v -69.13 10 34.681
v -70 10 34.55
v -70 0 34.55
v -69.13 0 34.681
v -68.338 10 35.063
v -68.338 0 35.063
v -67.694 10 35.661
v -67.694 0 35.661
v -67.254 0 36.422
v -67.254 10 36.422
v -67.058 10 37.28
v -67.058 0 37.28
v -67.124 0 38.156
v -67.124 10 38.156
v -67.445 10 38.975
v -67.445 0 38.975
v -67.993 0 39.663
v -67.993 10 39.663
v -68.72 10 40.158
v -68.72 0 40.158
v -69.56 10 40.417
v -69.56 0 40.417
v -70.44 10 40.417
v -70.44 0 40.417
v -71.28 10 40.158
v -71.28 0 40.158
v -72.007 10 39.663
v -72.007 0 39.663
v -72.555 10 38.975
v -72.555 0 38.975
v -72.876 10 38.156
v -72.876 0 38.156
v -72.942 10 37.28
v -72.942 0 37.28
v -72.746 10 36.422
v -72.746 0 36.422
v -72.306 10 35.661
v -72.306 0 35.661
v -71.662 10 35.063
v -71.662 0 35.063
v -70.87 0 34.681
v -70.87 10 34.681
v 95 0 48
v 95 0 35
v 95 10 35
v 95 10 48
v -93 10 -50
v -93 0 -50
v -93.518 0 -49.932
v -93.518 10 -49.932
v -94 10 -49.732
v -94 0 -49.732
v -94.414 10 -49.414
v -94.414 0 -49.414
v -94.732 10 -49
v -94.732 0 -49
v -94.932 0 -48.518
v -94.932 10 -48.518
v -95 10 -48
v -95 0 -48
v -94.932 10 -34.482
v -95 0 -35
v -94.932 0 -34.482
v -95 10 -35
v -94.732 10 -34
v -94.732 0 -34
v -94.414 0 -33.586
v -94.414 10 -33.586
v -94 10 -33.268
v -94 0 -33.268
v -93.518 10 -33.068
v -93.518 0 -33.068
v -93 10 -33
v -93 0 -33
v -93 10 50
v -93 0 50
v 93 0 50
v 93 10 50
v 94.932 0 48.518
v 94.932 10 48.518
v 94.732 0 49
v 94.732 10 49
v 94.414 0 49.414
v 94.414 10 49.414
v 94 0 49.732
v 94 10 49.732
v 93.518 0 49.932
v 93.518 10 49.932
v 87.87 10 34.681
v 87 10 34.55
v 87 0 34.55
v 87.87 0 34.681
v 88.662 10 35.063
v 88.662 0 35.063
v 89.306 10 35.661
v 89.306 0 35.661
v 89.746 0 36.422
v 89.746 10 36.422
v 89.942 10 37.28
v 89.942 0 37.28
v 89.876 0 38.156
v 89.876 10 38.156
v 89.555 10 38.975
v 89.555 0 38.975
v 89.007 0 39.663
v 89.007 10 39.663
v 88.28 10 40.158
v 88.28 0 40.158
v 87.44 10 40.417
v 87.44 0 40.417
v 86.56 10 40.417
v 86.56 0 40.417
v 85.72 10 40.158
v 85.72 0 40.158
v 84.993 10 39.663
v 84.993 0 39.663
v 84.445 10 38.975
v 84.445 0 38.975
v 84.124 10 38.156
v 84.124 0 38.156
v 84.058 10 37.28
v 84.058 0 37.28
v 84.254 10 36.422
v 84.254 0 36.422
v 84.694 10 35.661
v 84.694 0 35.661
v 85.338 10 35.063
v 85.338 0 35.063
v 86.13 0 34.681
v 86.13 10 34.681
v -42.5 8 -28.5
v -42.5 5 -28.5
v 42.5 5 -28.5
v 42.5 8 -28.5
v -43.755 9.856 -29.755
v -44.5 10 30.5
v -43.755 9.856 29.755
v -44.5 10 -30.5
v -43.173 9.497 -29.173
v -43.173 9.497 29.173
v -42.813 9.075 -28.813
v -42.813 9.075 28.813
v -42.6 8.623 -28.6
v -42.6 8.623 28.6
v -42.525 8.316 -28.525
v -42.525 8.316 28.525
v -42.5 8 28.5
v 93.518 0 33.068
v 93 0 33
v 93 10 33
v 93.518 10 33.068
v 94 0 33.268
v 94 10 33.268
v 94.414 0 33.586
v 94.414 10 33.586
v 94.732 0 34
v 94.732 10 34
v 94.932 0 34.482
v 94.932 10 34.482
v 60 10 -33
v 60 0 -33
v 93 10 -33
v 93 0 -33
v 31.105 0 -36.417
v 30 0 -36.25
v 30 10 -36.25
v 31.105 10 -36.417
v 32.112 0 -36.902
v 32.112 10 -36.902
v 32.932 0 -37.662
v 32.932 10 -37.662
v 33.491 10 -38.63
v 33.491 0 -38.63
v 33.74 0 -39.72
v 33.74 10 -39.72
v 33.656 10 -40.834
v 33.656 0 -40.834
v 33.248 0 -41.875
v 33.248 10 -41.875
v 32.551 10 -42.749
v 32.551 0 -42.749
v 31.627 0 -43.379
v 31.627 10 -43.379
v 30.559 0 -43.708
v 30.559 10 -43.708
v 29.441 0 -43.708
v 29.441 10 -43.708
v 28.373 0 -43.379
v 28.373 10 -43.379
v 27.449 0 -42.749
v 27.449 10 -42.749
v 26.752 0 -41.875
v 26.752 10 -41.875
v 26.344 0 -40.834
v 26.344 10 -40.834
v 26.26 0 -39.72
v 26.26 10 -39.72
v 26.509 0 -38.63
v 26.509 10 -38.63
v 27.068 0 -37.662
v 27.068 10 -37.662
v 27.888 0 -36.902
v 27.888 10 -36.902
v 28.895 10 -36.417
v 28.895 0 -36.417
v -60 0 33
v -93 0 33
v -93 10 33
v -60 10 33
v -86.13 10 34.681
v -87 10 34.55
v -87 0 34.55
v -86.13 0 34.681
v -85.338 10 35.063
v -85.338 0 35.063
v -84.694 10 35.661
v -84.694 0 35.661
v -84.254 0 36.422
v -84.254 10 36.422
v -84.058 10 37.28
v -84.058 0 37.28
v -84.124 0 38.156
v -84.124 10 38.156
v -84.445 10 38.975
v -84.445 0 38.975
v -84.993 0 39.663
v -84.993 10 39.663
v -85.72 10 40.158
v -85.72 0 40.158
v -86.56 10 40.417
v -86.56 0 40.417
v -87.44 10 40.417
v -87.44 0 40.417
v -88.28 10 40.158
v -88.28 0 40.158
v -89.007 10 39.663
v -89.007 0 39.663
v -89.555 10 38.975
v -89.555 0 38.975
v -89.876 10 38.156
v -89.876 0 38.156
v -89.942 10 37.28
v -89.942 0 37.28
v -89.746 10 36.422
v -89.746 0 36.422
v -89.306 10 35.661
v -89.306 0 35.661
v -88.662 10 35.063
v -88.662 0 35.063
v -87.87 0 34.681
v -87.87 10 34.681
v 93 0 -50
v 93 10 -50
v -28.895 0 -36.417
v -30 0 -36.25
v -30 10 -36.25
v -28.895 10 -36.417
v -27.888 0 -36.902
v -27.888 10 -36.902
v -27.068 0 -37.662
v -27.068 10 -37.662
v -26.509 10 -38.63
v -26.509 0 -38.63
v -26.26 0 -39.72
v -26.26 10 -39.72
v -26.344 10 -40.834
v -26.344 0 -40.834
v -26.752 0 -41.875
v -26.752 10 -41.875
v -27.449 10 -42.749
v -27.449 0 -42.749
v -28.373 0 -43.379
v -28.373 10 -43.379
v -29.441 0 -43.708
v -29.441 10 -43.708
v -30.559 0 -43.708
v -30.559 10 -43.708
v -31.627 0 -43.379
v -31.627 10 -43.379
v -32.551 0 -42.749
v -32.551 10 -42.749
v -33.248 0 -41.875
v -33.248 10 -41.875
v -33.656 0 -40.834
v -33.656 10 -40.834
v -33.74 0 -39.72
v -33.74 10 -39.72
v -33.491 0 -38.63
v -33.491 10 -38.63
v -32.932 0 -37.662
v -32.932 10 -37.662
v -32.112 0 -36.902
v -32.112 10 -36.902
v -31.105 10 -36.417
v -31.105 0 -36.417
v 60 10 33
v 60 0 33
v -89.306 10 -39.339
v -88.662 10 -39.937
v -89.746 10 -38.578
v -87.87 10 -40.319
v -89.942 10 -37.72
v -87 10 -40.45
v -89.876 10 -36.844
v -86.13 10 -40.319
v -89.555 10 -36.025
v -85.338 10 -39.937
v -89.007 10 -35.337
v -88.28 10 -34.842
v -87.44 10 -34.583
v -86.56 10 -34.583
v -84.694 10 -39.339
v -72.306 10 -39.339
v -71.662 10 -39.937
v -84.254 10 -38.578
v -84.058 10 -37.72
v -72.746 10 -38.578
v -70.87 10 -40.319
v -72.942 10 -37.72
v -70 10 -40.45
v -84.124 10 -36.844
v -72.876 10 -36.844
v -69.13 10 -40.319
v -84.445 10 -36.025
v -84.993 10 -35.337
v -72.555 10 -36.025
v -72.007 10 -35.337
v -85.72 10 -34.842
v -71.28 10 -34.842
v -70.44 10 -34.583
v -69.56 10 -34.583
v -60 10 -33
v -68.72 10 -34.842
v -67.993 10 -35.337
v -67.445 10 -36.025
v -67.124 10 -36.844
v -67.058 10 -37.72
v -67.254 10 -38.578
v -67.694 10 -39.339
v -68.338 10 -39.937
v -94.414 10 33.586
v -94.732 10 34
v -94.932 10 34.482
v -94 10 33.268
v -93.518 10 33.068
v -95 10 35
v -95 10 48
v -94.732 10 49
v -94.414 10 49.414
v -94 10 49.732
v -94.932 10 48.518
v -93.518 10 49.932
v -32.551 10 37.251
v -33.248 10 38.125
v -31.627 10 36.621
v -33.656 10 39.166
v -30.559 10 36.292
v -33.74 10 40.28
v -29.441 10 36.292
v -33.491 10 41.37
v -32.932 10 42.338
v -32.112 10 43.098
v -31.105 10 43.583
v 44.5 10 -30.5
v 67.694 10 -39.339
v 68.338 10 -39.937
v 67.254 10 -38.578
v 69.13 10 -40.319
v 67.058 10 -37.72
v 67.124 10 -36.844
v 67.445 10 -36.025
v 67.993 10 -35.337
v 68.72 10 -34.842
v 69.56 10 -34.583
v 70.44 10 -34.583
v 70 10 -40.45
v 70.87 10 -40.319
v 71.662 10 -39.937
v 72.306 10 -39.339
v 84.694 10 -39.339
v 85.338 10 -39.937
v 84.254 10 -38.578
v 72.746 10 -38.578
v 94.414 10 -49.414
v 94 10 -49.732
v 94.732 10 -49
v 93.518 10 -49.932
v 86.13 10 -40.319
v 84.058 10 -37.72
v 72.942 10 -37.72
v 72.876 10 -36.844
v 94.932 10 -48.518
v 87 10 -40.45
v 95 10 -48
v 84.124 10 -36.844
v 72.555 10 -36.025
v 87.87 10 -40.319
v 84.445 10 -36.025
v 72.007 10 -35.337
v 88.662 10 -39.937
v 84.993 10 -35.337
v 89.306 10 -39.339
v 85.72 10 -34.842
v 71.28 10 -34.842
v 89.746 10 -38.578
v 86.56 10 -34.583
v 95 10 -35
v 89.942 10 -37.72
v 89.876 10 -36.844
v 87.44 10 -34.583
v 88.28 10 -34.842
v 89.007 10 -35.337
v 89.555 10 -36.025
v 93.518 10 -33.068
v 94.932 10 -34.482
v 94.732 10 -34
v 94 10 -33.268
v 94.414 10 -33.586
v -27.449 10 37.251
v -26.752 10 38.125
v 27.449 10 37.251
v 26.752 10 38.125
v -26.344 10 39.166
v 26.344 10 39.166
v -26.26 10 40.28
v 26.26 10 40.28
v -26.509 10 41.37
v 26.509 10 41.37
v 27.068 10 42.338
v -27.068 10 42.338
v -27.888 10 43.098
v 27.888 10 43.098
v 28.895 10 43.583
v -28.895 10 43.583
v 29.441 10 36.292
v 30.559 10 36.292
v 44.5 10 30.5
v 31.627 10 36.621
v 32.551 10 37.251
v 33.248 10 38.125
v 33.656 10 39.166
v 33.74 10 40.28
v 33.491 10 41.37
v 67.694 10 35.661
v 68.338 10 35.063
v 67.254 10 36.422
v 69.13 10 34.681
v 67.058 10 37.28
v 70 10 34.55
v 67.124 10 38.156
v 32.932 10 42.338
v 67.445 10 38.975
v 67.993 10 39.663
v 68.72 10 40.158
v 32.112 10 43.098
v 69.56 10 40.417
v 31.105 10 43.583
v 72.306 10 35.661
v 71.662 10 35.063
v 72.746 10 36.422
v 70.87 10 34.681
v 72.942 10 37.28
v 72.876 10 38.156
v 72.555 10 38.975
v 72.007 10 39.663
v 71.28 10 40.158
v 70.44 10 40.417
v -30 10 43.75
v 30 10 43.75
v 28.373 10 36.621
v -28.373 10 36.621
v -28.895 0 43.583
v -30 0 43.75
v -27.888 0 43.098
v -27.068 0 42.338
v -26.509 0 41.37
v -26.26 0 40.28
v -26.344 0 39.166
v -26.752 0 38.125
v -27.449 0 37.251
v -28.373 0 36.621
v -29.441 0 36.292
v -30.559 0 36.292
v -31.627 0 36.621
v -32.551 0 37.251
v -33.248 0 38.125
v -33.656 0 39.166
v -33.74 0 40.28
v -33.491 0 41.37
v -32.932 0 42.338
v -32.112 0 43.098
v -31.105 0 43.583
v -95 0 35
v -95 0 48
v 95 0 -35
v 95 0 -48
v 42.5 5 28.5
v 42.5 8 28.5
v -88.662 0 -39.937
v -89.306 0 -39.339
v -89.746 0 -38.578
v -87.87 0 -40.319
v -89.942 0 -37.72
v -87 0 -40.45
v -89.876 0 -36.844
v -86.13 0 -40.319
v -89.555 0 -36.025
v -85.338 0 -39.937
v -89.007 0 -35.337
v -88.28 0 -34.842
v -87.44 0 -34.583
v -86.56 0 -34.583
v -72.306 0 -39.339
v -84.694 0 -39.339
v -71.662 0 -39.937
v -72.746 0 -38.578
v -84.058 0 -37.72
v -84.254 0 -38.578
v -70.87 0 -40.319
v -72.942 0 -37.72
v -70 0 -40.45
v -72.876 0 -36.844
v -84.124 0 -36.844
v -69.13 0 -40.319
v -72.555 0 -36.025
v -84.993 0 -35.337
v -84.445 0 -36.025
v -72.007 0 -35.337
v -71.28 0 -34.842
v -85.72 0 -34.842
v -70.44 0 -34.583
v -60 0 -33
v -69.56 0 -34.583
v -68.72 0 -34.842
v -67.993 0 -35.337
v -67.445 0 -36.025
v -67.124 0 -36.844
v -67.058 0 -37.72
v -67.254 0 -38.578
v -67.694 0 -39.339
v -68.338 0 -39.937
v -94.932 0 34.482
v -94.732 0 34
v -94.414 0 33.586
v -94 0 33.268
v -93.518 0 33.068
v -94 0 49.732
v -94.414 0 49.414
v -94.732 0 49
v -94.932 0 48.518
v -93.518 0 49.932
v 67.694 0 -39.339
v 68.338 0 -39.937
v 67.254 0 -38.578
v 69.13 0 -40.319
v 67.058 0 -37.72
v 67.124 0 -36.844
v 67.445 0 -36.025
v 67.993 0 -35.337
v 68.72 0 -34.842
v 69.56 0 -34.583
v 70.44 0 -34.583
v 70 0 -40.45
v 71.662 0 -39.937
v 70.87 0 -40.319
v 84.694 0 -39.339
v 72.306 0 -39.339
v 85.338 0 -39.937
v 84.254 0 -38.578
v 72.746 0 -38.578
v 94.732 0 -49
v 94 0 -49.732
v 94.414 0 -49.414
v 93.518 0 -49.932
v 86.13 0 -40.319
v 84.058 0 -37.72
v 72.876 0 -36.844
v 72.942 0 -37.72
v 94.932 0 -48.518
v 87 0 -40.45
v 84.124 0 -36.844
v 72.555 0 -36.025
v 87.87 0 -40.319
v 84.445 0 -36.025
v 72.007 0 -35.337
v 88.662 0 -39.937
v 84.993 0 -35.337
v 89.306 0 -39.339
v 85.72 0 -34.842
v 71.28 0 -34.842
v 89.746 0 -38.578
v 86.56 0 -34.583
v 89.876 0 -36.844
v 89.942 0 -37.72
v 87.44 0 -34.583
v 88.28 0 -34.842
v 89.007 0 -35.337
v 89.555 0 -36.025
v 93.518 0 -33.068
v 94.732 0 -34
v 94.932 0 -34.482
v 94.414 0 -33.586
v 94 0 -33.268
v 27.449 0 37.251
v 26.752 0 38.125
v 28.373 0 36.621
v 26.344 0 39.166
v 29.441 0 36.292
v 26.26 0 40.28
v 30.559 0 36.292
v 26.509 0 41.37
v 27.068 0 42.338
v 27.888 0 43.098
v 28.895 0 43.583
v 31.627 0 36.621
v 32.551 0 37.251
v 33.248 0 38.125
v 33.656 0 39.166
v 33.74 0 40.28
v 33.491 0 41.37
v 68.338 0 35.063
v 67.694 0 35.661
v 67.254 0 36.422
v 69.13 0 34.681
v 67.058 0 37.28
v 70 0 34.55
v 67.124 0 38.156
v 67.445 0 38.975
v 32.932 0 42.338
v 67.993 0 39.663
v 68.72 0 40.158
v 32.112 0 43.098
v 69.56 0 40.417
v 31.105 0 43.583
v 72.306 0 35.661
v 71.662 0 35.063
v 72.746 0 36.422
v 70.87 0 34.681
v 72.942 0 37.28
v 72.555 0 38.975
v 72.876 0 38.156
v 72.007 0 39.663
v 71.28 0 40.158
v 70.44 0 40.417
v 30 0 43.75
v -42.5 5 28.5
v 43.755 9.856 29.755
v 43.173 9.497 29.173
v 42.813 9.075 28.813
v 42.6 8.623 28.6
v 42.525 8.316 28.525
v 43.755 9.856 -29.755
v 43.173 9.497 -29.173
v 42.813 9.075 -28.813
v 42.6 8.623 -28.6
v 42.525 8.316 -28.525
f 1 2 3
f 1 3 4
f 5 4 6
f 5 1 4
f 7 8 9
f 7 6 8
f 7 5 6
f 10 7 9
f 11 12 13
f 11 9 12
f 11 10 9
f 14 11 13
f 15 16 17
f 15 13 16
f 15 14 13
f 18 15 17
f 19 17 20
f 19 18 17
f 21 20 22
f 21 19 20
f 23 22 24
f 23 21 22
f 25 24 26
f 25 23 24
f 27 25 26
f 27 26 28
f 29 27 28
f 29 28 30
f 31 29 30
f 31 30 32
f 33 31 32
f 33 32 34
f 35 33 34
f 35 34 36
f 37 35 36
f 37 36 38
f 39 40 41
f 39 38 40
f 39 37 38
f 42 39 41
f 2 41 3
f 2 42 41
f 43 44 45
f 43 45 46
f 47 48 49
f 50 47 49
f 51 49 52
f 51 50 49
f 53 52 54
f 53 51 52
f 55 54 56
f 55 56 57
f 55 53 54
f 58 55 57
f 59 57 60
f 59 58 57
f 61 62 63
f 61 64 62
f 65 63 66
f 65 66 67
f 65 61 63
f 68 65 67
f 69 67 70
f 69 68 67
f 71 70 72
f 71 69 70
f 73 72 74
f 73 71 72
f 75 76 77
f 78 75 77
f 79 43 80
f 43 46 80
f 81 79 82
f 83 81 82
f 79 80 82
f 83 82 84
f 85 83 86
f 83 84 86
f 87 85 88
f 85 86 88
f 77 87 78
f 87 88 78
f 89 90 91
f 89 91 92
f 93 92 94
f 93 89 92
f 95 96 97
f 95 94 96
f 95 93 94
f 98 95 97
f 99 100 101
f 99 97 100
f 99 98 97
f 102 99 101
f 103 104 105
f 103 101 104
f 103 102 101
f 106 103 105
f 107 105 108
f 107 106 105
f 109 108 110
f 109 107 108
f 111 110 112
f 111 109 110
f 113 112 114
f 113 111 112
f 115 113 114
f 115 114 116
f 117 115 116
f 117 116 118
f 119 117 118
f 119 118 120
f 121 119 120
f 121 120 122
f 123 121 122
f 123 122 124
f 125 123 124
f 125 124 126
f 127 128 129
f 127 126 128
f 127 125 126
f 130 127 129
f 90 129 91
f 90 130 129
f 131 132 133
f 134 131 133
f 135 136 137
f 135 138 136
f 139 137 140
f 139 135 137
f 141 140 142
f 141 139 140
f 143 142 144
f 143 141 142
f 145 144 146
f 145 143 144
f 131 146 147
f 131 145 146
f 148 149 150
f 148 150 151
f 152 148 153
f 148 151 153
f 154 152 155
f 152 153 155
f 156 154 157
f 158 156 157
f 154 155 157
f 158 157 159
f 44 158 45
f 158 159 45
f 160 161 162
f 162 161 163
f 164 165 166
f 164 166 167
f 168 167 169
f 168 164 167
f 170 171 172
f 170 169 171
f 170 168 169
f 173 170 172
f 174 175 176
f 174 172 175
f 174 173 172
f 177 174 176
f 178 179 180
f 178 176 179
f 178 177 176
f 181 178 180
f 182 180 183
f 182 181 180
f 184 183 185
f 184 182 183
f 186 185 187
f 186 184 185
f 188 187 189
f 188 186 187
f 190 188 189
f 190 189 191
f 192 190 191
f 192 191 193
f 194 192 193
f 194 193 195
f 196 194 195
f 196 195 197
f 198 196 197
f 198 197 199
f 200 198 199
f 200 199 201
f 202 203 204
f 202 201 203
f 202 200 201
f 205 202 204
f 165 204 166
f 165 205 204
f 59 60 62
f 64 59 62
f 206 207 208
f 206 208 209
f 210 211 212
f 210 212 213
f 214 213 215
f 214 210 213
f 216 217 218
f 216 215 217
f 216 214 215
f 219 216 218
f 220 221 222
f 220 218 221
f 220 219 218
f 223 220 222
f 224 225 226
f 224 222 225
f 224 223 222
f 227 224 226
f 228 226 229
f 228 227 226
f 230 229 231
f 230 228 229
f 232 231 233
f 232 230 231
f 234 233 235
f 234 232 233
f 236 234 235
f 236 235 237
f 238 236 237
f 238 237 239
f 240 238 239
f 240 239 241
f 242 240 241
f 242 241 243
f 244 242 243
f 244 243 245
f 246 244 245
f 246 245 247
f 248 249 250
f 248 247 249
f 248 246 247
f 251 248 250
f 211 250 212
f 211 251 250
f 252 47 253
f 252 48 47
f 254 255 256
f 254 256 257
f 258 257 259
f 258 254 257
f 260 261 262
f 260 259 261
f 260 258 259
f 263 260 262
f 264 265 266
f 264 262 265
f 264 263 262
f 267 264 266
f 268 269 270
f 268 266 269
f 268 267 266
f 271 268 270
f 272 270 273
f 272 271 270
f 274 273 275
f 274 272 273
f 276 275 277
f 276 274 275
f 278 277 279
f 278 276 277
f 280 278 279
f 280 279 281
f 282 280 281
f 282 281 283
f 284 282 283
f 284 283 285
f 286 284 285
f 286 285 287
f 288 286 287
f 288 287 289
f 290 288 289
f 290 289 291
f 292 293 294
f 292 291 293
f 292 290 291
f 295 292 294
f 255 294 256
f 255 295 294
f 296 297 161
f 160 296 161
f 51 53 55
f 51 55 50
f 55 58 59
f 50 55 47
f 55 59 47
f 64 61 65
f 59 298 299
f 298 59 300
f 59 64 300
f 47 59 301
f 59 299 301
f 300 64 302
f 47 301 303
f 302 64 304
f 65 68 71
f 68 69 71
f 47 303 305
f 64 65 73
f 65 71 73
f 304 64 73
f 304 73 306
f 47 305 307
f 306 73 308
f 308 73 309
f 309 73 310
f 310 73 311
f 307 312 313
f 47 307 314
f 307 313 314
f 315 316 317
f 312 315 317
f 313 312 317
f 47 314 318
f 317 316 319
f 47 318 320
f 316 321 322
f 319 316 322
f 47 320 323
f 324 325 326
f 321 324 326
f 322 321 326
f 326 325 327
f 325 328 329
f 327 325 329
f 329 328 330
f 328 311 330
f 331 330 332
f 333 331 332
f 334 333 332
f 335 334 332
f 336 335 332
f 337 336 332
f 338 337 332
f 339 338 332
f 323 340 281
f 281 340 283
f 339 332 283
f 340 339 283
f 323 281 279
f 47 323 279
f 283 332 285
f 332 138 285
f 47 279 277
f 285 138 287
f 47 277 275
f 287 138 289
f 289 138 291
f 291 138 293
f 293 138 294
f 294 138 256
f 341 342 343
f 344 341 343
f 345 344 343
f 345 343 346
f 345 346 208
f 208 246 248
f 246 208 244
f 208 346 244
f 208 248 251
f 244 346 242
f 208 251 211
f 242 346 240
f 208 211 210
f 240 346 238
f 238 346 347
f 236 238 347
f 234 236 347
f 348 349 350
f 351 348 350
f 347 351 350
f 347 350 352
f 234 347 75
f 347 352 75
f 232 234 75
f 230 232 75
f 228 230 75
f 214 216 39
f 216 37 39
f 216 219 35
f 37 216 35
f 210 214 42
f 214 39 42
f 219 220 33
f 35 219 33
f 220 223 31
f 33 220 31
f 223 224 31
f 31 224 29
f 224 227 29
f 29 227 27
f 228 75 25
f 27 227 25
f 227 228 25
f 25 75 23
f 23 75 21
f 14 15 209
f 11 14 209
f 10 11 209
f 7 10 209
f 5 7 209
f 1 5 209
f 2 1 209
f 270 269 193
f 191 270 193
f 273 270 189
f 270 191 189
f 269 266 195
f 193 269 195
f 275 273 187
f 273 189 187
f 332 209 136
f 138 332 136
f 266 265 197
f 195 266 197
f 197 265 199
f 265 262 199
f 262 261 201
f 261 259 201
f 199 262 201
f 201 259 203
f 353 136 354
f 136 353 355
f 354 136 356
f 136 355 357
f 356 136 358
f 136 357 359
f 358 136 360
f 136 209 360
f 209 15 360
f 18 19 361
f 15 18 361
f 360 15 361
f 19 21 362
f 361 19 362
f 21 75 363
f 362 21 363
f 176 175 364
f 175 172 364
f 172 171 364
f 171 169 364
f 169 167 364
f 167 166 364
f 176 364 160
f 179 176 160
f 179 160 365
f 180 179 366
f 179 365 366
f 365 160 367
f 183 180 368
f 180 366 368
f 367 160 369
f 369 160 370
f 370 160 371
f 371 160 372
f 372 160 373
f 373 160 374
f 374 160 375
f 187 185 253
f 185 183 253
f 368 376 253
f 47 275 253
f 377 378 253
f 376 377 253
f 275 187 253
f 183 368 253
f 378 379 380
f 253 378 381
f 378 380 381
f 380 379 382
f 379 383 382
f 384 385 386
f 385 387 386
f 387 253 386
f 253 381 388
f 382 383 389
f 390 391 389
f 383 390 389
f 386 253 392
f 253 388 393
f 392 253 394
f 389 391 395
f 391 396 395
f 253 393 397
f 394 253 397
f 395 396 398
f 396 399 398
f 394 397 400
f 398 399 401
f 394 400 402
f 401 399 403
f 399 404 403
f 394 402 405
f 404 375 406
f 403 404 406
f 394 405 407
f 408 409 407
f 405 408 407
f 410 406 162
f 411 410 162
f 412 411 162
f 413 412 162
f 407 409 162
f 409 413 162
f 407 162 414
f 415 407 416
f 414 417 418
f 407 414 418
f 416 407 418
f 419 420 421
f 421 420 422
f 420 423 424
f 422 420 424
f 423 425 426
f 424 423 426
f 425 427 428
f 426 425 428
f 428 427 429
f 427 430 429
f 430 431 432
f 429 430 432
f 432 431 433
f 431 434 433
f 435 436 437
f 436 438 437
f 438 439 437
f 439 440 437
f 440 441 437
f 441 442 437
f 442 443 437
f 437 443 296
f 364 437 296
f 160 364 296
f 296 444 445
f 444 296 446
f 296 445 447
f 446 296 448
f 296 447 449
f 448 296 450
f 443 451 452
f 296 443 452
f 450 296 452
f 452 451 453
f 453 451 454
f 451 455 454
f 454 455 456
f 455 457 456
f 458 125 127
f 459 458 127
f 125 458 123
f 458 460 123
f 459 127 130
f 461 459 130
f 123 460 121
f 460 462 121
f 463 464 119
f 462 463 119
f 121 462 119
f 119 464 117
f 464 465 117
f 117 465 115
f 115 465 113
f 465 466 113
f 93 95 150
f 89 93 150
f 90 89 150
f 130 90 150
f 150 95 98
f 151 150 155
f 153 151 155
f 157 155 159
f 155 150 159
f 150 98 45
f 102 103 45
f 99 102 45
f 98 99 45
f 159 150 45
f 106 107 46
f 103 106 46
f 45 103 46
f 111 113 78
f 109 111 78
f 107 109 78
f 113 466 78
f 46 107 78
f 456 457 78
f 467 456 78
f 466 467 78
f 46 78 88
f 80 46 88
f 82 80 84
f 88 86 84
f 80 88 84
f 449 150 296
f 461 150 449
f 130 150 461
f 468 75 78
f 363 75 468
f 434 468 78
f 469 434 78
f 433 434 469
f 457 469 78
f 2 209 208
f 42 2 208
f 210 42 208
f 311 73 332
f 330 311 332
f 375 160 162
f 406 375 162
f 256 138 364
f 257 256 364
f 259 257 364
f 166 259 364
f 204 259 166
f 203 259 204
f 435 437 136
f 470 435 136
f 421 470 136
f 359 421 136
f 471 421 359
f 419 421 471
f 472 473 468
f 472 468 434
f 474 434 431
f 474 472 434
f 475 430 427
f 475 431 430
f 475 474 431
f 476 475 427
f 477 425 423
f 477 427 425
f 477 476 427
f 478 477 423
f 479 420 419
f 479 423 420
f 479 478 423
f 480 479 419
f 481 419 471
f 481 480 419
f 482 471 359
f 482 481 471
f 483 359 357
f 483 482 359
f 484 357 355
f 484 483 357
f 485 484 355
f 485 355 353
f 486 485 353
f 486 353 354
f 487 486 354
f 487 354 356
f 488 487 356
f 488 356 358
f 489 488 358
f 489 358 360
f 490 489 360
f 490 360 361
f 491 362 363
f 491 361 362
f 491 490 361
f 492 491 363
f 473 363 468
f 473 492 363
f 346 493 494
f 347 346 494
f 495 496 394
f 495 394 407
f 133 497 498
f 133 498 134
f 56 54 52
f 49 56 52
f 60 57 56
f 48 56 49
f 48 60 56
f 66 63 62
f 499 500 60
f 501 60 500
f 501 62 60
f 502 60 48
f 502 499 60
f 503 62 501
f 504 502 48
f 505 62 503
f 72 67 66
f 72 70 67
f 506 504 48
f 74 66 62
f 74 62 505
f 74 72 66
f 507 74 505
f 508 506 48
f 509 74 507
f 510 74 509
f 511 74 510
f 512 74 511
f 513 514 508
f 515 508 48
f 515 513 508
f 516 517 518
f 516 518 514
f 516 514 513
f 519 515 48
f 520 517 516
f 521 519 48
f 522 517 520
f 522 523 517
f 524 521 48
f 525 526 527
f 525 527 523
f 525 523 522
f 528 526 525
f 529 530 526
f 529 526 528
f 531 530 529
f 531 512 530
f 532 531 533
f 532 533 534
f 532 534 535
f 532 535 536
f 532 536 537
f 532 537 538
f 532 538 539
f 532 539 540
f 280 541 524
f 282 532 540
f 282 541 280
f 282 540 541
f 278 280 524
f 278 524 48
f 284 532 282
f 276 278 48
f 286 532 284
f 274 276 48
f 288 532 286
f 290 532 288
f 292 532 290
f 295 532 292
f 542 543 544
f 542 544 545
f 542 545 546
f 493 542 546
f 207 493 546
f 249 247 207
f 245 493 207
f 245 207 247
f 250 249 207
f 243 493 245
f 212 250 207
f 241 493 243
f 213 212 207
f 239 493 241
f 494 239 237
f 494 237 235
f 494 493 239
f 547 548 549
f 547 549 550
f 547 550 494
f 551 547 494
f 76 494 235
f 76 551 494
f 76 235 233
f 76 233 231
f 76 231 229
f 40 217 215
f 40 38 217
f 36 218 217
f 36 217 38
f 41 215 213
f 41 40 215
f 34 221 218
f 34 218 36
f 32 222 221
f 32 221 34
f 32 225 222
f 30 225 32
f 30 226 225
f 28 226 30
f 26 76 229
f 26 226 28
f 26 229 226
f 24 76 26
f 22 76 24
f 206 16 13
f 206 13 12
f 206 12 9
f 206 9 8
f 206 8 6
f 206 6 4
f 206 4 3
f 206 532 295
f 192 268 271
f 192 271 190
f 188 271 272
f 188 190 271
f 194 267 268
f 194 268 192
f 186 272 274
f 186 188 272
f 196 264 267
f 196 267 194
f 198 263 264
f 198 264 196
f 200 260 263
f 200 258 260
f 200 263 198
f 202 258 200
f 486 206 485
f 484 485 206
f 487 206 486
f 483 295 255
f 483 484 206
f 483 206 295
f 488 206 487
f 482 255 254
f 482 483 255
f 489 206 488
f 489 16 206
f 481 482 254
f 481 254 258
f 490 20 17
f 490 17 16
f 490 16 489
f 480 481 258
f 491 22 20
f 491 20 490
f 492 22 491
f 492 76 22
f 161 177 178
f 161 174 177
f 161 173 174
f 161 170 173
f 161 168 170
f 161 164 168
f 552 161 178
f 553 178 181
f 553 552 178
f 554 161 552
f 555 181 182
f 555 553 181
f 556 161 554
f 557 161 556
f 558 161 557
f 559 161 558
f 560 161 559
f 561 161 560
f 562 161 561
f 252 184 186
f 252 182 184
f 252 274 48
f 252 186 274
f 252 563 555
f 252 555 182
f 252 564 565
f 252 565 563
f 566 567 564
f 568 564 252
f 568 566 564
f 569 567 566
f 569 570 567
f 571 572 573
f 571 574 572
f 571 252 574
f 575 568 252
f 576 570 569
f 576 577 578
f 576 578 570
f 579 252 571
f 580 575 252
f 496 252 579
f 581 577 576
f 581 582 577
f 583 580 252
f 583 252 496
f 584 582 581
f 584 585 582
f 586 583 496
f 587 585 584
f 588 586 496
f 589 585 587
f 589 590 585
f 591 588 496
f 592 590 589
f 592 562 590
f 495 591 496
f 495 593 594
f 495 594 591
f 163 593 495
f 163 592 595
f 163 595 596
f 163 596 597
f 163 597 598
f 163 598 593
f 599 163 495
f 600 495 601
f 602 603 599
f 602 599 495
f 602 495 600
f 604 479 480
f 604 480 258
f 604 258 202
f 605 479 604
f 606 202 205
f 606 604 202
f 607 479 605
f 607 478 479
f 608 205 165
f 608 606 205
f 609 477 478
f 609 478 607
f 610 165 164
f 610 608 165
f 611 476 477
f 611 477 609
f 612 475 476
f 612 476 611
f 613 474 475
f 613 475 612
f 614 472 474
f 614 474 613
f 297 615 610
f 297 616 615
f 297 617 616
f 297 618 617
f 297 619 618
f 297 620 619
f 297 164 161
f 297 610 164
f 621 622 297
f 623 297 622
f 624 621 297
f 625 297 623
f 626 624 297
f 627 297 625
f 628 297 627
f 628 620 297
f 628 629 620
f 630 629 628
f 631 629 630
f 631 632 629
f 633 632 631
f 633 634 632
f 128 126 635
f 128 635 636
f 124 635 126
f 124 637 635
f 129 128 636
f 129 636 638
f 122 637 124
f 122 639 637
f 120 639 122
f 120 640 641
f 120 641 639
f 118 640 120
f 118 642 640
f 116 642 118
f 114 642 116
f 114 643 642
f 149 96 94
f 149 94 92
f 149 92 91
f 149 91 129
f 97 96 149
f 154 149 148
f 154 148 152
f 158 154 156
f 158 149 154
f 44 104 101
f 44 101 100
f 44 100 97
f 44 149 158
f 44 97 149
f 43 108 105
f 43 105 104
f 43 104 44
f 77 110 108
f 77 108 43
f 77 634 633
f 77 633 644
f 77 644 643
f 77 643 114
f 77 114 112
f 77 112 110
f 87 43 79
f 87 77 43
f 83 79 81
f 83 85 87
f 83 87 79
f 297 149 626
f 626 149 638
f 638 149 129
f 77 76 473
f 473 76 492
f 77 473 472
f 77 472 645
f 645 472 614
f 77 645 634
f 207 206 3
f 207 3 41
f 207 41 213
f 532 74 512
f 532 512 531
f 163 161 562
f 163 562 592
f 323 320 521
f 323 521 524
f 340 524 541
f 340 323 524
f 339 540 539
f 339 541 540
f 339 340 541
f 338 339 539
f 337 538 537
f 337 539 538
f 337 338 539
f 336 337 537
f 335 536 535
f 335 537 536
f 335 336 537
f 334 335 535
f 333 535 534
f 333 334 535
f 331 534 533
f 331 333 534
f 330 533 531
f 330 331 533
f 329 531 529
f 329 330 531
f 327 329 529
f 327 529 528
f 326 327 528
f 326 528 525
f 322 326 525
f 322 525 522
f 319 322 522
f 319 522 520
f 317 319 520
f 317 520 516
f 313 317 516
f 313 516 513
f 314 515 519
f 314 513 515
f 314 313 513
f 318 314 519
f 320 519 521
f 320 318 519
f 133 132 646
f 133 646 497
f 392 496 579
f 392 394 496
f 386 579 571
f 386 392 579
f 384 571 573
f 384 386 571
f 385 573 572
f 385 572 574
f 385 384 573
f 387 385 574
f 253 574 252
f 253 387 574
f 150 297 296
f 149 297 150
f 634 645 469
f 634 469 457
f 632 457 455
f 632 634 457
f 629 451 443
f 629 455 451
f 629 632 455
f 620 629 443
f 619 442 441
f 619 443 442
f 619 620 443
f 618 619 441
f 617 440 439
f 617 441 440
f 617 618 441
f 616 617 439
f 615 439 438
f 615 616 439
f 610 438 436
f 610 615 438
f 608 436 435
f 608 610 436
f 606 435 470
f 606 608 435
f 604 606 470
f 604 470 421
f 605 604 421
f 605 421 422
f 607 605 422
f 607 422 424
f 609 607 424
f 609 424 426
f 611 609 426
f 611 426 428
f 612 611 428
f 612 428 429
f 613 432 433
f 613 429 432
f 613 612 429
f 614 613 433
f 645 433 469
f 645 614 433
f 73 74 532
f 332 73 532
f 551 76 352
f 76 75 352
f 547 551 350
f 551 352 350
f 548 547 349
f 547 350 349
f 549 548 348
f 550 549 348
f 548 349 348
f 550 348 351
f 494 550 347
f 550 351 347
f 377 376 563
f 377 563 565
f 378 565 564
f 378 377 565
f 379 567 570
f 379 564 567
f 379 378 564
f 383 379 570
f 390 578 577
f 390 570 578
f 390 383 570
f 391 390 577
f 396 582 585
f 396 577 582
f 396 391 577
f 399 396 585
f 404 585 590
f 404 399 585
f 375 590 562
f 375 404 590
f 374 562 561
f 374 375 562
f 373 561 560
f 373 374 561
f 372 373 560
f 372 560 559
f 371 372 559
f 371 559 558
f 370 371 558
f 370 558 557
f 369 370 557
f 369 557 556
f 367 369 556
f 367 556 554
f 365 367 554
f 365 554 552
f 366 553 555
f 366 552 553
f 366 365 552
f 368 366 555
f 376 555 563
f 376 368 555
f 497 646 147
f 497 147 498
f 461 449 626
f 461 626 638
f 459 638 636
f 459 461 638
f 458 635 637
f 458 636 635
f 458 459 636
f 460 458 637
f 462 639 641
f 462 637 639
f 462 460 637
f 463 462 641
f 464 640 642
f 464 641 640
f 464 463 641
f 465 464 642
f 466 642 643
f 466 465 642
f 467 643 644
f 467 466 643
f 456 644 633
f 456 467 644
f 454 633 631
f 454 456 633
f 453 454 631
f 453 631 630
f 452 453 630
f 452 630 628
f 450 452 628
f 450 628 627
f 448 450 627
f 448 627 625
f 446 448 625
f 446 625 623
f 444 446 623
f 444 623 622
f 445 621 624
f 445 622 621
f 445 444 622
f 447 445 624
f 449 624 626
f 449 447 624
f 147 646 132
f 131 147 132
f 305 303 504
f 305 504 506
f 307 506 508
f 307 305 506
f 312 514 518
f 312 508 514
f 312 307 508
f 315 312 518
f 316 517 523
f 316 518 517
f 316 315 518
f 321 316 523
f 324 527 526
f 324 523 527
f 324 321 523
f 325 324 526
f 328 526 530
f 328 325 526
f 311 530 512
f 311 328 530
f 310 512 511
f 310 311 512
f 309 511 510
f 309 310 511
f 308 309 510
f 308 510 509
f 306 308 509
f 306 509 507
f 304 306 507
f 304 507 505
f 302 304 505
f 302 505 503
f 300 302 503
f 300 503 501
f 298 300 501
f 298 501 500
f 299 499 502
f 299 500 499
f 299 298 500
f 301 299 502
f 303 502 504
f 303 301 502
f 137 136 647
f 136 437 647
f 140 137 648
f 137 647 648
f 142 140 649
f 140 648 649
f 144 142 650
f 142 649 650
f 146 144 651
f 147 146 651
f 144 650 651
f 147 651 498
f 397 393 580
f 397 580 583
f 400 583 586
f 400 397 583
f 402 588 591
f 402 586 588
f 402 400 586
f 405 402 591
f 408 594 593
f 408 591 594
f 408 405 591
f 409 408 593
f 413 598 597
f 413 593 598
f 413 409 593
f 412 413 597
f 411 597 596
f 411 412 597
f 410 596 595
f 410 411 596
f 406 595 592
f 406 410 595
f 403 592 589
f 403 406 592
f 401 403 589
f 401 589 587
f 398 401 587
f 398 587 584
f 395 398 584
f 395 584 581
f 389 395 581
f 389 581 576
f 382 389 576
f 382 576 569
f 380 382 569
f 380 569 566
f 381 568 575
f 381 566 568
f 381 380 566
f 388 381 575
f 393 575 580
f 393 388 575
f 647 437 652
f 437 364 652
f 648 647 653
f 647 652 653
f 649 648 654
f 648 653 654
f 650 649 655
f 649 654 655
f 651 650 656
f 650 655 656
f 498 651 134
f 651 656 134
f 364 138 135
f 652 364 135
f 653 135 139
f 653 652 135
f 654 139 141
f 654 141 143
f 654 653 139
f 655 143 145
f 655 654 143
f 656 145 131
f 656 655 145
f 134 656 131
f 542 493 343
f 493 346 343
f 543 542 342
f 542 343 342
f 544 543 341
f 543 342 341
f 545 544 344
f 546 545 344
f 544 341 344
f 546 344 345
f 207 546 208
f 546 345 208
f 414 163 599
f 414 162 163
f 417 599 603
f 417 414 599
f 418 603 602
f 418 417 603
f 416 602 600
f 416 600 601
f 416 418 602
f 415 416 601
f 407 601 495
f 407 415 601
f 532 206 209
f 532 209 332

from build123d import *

# Parameters (mm, degrees)
SKETCH1_W               = 120
SKETCH1_H               = 100
BOSS_EXTRUDE1_DEPTH     = 5
SKETCH2_W               = 120
SKETCH2_H               = 100
SKETCH2_W_2             = 85
SKETCH2_H_2             = 57
BOSS_EXTRUDE2_DEPTH     = 5
SKETCH3_W               = 35
SKETCH3_H               = 17
BOSS_EXTRUDE3_DEPTH     = 10
CUT_EXTRUDE1_DEPTH      = 108.819293264
CUT_EXTRUDE1_DEPTH_BACK = 108.819293264
SKETCH4_R               = 2.95
FILLET1_R               = 2
CUT_EXTRUDE2_DEPTH      = 108.819293264
CUT_EXTRUDE2_DEPTH_BACK = 108.819293264
SKETCH5_R               = 3.75


with BuildPart() as part:
    # Sketch1 → Boss-Extrude1 (new body)
    with BuildSketch(Plane(origin=(0, 0, 0), x_dir=(1, 0, 0), z_dir=(0, 1, 0))):
        Rectangle(SKETCH1_W, SKETCH1_H)
    extrude(amount=BOSS_EXTRUDE1_DEPTH)

    # Sketch2 → Boss-Extrude2 (add)
    with BuildSketch(Plane(origin=(0, 5, 0), x_dir=(1, 0, 0), z_dir=(0, 1, 0))):
        Rectangle(SKETCH2_W, SKETCH2_H)
        Rectangle(SKETCH2_W_2, SKETCH2_H_2, mode=Mode.SUBTRACT)
    extrude(amount=BOSS_EXTRUDE2_DEPTH)

    # Sketch3 → Boss-Extrude3 (add)
    with BuildSketch(Plane.XZ):
        with Locations((77.5, 41.5)):
            Rectangle(SKETCH3_W, SKETCH3_H)
        with Locations((77.5, -41.5)):
            Rectangle(SKETCH3_W, SKETCH3_H)
        with Locations((-77.5, -41.5)):
            Rectangle(SKETCH3_W, SKETCH3_H)
        with Locations((-77.5, 41.5)):
            Rectangle(SKETCH3_W, SKETCH3_H)
    extrude(amount=-BOSS_EXTRUDE3_DEPTH)

    # Sketch4 → Cut-Extrude1 (cut, two sides: drawn at the far end of the back side and taken through both)
    with BuildSketch(Plane.XZ.offset(-CUT_EXTRUDE1_DEPTH_BACK)):
        with Locations(Location((70, 37.5, 0), (0, 0, 270))):
            Circle(SKETCH4_R)
        with Locations(Location((87, 37.5, 0), (0, 0, 270))):
            Circle(SKETCH4_R)
        with Locations(Location((70, -37.5, 0), (0, 0, 270))):
            Circle(SKETCH4_R)
        with Locations(Location((87, -37.5, 0), (0, 0, 270))):
            Circle(SKETCH4_R)
        with Locations(Location((-87, -37.5, 0), (0, 0, 270))):
            Circle(SKETCH4_R)
        with Locations(Location((-70, -37.5, 0), (0, 0, 270))):
            Circle(SKETCH4_R)
        with Locations(Location((-87, 37.5, 0), (0, 0, 270))):
            Circle(SKETCH4_R)
        with Locations(Location((-70, 37.5, 0), (0, 0, 270))):
            Circle(SKETCH4_R)
    extrude(amount=CUT_EXTRUDE1_DEPTH + CUT_EXTRUDE1_DEPTH_BACK, mode=Mode.SUBTRACT)

    # Fillet1
    fillet1_edges = [part.edges().sort_by_distance(p)[0] for p in [
        (42.5, 10, 0),
        (0, 10, -28.5),
        (-42.5, 10, 0),
        (0, 10, 28.5),
        (95, 5, 50),
        (95, 5, 33),
        (95, 5, -33),
        (95, 5, -50),
        (-95, 5, -50),
        (-95, 5, -33),
        (-95, 5, 50),
        (-95, 5, 33),
    ]]
    fillet(fillet1_edges, radius=FILLET1_R)

    # Sketch5 → Cut-Extrude2 (cut, two sides: drawn at the far end of the back side and taken through both)
    with BuildSketch(Plane(origin=(0, 10, 0), x_dir=(1, 0, 0), z_dir=(0, 1, 0)).offset(-CUT_EXTRUDE2_DEPTH_BACK)):
        with Locations(Location((-30, 40, 0), (0, 0, 270))):
            Circle(SKETCH5_R)
        with Locations(Location((30, 40, 0), (0, 0, 270))):
            Circle(SKETCH5_R)
        with Locations(Location((-30, -40, 0), (0, 0, 270))):
            Circle(SKETCH5_R)
        with Locations(Location((30, -40, 0), (0, 0, 270))):
            Circle(SKETCH5_R)
    extrude(amount=CUT_EXTRUDE2_DEPTH + CUT_EXTRUDE2_DEPTH_BACK, mode=Mode.SUBTRACT)


solid = part.part
